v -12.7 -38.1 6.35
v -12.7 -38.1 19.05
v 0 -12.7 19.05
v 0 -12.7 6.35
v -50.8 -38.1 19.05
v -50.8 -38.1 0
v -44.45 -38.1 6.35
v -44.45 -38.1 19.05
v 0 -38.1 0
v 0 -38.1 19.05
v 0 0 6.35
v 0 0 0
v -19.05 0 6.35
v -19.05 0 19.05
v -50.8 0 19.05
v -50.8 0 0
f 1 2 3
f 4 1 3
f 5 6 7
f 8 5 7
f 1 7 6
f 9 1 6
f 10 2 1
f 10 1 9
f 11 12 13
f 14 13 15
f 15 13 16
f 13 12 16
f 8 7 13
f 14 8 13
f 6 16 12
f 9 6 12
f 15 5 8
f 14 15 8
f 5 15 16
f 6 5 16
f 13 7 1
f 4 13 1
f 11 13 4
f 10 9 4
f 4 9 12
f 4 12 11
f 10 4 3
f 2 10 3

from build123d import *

# Parameters (mm, degrees)
F1_DEPTH = 38.1
F3_DEPTH = 12.7
F5_DEPTH = 12.7


with BuildPart() as f1:
    # F0 (on Front) → F1 (new body)
    with BuildSketch(Plane.XZ):
        Polygon((-50.8, 0), (0, 0), (0, 19.05), (-12.7, 19.05), (-12.7, 6.35), (-44.45, 6.35), (-44.45, 19.05), (-50.8, 19.05), align=None)
    extrude(amount=F1_DEPTH)

    # F2 (on face) → F3 (cut)
    with BuildSketch(Plane.XY.offset(19.05)):
        Polygon((-12.7, -38.1), (0, -12.7), (0, 0), (-12.7, 0), align=None)
    extrude(amount=-F3_DEPTH, mode=Mode.SUBTRACT)

    # F4 (on face) → F5 (join)
    with BuildSketch(Plane.XY.offset(6.35)):
        Polygon((-19.05, 0), (-44.45, 0), (-44.45, -38.1), align=None)
    extrude(amount=F5_DEPTH)


solid = f1.part
